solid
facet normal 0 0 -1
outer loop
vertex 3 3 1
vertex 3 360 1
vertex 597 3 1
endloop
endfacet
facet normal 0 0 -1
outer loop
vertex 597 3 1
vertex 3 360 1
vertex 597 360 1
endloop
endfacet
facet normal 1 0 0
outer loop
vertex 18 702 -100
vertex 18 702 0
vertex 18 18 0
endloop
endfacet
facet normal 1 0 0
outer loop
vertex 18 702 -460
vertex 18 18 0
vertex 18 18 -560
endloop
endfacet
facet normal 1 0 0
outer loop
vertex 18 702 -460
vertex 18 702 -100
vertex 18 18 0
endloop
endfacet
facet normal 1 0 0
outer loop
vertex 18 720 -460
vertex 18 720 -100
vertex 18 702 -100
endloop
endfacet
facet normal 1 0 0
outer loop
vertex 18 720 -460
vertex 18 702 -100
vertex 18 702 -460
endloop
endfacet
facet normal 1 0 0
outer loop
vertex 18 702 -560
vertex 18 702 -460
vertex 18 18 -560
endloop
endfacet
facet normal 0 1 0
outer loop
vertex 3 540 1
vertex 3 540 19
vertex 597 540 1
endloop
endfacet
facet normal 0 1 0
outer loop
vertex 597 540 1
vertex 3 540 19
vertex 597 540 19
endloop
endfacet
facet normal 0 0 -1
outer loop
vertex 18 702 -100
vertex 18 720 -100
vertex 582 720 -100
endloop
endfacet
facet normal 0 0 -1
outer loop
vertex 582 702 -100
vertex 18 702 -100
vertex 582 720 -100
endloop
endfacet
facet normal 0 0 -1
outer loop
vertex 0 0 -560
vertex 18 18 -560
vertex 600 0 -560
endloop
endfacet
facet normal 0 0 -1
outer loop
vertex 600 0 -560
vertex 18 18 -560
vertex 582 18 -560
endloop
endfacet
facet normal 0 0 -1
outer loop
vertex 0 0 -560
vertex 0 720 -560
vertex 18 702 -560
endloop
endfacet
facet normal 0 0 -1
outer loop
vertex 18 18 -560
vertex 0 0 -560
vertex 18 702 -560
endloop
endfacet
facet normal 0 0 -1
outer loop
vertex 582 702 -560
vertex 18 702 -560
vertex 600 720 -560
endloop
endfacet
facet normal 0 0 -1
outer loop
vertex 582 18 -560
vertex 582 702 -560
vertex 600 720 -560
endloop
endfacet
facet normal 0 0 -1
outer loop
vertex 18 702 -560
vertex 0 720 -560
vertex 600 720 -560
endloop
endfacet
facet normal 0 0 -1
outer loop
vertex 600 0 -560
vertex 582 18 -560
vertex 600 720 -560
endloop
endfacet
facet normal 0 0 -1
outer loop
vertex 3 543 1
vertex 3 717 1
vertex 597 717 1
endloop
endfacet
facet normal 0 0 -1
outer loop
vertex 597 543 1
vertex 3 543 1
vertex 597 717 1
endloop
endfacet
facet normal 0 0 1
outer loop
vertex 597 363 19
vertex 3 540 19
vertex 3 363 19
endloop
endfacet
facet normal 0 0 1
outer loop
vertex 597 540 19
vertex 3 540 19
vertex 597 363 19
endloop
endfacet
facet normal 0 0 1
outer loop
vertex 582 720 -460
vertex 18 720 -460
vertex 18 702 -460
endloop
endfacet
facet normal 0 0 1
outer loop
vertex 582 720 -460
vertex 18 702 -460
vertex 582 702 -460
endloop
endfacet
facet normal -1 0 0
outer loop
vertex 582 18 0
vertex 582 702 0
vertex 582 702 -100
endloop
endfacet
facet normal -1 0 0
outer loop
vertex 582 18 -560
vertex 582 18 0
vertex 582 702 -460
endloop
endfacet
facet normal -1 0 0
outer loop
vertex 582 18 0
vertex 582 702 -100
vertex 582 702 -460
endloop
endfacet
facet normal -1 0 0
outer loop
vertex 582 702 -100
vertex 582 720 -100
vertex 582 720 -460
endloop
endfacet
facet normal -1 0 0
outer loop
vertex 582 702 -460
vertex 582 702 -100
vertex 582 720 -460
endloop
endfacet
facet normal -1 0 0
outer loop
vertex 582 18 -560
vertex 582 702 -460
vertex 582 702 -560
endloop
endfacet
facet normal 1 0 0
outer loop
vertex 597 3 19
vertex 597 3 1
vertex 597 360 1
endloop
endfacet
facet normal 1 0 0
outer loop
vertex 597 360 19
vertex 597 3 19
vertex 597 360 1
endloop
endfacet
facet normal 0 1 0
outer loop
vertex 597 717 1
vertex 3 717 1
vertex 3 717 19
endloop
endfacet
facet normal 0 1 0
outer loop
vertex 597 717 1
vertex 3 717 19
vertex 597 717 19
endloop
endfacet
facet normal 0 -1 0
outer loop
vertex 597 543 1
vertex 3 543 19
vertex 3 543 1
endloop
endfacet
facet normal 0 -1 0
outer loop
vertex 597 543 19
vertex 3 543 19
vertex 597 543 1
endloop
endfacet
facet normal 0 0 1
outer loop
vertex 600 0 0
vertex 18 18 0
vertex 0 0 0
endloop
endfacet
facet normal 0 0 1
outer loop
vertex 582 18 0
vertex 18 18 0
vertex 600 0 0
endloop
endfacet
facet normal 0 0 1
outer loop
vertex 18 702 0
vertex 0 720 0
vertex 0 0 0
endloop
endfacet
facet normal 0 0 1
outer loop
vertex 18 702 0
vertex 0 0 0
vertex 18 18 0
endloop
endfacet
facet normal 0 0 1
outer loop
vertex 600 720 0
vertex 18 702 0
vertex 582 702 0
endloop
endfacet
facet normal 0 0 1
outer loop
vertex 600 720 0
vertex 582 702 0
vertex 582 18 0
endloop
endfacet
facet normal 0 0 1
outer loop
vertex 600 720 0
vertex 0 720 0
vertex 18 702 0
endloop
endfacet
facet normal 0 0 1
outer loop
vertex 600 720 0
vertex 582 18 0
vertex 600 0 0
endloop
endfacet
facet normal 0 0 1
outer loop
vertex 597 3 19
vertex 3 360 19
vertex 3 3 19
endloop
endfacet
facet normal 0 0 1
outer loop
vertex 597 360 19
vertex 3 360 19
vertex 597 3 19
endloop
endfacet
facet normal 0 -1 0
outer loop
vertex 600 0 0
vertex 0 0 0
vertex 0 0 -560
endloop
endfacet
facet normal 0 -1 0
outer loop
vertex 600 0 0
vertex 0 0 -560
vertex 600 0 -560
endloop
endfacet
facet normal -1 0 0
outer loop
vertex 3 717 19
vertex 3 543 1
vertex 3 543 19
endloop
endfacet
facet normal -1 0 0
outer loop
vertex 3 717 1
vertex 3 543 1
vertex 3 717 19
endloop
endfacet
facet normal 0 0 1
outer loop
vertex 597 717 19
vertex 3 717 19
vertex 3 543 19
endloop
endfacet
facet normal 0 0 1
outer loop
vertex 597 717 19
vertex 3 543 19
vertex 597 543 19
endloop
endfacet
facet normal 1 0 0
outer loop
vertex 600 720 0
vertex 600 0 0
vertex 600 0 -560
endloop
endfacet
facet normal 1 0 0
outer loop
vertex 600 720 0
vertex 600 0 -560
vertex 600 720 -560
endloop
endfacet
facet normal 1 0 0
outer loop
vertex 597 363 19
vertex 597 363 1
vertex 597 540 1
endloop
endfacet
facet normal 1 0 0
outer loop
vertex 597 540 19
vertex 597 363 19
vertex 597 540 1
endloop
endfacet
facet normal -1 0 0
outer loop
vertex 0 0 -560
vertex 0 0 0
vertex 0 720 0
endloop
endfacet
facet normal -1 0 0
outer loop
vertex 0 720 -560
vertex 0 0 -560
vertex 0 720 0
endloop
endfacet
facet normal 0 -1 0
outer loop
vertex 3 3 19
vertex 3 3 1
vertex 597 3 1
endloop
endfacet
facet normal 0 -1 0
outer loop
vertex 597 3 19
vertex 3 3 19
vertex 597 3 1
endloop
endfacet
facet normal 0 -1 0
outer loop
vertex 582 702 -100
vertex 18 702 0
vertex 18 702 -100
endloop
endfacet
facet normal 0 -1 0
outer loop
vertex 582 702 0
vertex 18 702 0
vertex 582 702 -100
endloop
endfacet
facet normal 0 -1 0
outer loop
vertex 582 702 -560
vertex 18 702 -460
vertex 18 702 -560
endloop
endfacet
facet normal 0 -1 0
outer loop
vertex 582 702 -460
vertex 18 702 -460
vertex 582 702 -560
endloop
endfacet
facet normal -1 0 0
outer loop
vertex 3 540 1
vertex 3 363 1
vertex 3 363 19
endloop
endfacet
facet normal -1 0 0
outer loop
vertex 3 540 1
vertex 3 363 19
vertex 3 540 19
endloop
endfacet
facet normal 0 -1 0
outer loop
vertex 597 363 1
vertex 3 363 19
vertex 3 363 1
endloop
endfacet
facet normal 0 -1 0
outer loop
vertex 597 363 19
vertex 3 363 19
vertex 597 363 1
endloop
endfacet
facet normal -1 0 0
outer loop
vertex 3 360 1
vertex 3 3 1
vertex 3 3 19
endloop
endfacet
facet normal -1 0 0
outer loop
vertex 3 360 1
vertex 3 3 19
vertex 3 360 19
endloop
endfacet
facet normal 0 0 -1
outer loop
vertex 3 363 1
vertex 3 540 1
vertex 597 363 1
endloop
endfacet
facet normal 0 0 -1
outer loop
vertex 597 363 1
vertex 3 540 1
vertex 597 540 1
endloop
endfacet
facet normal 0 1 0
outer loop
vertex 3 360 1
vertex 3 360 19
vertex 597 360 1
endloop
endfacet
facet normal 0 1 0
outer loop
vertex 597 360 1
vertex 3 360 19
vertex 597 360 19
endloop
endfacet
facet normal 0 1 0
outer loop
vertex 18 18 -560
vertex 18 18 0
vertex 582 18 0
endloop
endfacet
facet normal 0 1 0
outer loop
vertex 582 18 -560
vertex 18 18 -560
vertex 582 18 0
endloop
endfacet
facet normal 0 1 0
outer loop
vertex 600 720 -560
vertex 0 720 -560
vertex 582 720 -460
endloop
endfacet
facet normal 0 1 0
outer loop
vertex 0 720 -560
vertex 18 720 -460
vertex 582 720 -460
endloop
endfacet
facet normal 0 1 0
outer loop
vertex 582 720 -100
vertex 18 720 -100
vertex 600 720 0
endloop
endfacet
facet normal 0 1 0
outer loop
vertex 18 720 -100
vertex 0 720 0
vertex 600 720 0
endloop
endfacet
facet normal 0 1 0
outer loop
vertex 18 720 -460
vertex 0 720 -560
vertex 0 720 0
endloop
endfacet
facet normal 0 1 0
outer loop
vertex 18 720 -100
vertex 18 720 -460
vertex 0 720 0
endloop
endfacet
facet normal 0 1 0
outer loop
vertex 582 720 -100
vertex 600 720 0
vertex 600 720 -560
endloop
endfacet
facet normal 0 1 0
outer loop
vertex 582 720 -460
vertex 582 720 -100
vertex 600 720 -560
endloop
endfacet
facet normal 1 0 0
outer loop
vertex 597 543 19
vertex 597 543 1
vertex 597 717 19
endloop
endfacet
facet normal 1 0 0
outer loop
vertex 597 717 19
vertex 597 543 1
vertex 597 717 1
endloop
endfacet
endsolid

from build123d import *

# Parameters (mm, degrees)
SKETCH1_W           = 600
SKETCH1_H           = 720
BOSS_EXTRUDE1_DEPTH = 560
SKETCH2_W           = 564
SKETCH2_H           = 684
CUT_EXTRUDE1_DEPTH  = 561
SKETCH3_W           = 564
SKETCH3_H           = 360
CUT_EXTRUDE2_DEPTH  = 702
SKETCH4_W           = 594
SKETCH4_H           = 714
BOSS_EXTRUDE2_DEPTH = 18
SKETCH5_W           = 594
SKETCH5_H           = 3
CUT_EXTRUDE3_DEPTH  = 18
SKETCH6_W           = 594
SKETCH6_H           = 3
CUT_EXTRUDE4_DEPTH  = 18


with BuildPart() as part:
    # Sketch1 → Boss-Extrude1 (new body)
    with BuildSketch(Plane.XY):
        with Locations((300, 360)):
            Rectangle(SKETCH1_W, SKETCH1_H)
    extrude(amount=-BOSS_EXTRUDE1_DEPTH)

    # Sketch2 → Cut-Extrude1 (cut, through all)
    with BuildSketch(Plane.XY):
        with Locations((300, 360)):
            Rectangle(SKETCH2_W, SKETCH2_H)
    extrude(amount=-CUT_EXTRUDE1_DEPTH, mode=Mode.SUBTRACT)

    # Sketch3 → Cut-Extrude2 (cut)
    with BuildSketch(Plane(origin=(0, 720, 0), x_dir=(1, 0, 0), z_dir=(0, 1, 0))):
        with Locations((300, 280)):
            Rectangle(SKETCH3_W, SKETCH3_H)
    extrude(amount=-CUT_EXTRUDE2_DEPTH, mode=Mode.SUBTRACT)


with BuildPart() as body_2:
    # Sketch4 → Boss-Extrude2 (new body)
    with BuildSketch(Plane.XY.offset(1)):
        with Locations((300, 360)):
            Rectangle(SKETCH4_W, SKETCH4_H)
    extrude(amount=BOSS_EXTRUDE2_DEPTH)

    # Sketch5 → Cut-Extrude3 (cut)
    with BuildSketch(Plane.XY.offset(19)):
        with Locations((300, 361.5)):
            Rectangle(SKETCH5_W, SKETCH5_H)
    extrude(amount=-CUT_EXTRUDE3_DEPTH, mode=Mode.SUBTRACT)

    # Sketch6 → Cut-Extrude4 (cut)
    with BuildSketch(Plane.XY.offset(19)):
        with Locations((300, 541.5)):
            Rectangle(SKETCH6_W, SKETCH6_H)
    extrude(amount=-CUT_EXTRUDE4_DEPTH, mode=Mode.SUBTRACT)


solid = Compound([part.part, body_2.part])
